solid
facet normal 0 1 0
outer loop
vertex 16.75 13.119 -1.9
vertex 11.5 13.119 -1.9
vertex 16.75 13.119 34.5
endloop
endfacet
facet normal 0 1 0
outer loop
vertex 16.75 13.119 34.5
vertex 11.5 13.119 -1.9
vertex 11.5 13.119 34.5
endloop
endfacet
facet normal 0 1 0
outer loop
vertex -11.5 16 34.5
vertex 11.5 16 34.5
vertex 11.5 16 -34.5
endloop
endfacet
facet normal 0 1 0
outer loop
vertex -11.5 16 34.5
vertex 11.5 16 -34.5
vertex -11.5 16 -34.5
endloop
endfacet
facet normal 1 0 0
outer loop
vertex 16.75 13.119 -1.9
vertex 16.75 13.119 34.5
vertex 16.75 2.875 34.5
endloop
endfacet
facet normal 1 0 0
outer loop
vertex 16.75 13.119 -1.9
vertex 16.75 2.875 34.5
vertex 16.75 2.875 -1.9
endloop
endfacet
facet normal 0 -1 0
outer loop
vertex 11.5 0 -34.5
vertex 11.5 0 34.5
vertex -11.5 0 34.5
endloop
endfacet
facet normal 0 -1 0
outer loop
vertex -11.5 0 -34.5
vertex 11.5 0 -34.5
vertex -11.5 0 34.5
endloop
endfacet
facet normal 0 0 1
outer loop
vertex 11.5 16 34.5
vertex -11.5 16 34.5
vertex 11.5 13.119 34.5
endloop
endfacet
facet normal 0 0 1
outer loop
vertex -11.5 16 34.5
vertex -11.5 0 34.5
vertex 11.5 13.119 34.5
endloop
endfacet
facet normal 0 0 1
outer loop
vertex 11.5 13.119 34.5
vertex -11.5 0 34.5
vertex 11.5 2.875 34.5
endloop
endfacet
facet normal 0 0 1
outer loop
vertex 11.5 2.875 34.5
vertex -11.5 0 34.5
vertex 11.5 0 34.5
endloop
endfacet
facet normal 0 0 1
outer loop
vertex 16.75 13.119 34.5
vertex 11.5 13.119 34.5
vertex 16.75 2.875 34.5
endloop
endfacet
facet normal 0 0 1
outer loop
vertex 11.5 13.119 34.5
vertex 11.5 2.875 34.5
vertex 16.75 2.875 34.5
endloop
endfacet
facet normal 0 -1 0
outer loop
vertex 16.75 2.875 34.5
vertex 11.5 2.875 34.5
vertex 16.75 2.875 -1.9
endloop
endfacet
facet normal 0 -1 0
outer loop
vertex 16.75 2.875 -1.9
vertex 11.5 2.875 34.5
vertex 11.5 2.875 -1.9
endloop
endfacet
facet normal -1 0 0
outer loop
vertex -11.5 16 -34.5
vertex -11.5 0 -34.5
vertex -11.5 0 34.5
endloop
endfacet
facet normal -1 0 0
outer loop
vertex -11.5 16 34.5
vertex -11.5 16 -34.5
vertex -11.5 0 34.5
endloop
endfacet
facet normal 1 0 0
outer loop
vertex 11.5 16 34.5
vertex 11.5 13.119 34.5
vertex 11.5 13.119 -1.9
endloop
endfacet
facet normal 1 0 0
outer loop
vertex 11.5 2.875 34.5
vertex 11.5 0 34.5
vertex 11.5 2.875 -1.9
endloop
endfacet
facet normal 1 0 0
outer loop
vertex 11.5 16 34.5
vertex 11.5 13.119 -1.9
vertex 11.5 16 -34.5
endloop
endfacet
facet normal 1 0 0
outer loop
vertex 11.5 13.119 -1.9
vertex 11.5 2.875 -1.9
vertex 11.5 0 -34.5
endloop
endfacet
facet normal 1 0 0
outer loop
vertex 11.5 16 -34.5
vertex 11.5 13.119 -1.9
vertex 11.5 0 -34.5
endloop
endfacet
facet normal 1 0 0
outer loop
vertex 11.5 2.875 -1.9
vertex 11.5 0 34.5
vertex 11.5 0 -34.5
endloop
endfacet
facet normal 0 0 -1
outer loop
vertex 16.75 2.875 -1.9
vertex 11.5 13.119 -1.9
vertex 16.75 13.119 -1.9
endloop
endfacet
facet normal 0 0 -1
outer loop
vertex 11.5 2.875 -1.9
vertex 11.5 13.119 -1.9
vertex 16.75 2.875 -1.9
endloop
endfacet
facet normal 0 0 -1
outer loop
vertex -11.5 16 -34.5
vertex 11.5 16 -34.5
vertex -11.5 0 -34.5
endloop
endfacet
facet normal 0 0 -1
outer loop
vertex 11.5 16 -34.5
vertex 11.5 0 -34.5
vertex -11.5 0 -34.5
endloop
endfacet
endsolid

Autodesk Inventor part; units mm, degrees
ref_plane "YZ Plane" through (0, 0, 0) normal (1, 0, 0) x (0, 1, 0)
ref_plane "XZ Plane" through (0, 0, 0) normal (0, 1, 0) x (-1, 0, 0)
sketch "Sketch1" plane through (0, 0, 0) normal (0, 1, 0) x (-1, 0, 0)
  line L0 (11.5, 34.5) -> (-11.5, 34.5)
  line L1 (-11.5, 34.5) -> (-11.5, -34.5)
  line L2 (-11.5, -34.5) -> (11.5, -34.5)
  line L3 (11.5, -34.5) -> (11.5, 34.5)
  line L4 (11.5, 34.5) -> (-11.5, -34.5) construction
  line L5 (-11.5, 34.5) -> (11.5, -34.5) construction
  point P0 (0, 0)
  dimension "d0" = 23
  dimension "d1" = 69
extrude "Extrusion1" add sketch "Sketch1" along normal blind 16
sketch "Sketch3" plane through (11.5, 0, 34.5) normal (1, 0, 0) x (0, 0, -1)
  line L0 (0, 0) -> (69, 0) projected
  line L1 (69, 0) -> (69, 16) projected
  line L2 (0, 16) -> (69, 16) projected
  line L3 (0, 0) -> (0, 16) projected
  line L4 (41.4, 13.119) -> (36.4, 13.119) projected
  line L5 (36.4, 13.119) -> (36.4, 11.6808) projected
  line L6 (36.4, 11.6668) -> (36.4, 3.375) projected
  line L7 (41.4, 2.875) -> (36.4, 2.875) projected
  line L8 (36.4, 3.375) -> (36.4, 2.875) projected
  line L9 (0, 0) -> (0, 16) projected
  line L10 (36.4, 13.119) -> (0, 13.119)
  line L11 (0, 13.119) -> (0, 2.875)
  line L12 (0, 2.875) -> (36.4, 2.875)
  line L13 (36.4, 2.875) -> (36.4, 13.119)
  point P0 (34.5, 0)
ref_plane "Work Plane1" through (16.75, 3.375, -6.9) normal (1, 0, 0) x (0, 1, 0)
extrude "Extrusion2" add sketch "Sketch3" along normal up to surface (5.25 mm away) contours L3 L10 L5 L13 L6 L8 L12
properties part number "bigLipo"
